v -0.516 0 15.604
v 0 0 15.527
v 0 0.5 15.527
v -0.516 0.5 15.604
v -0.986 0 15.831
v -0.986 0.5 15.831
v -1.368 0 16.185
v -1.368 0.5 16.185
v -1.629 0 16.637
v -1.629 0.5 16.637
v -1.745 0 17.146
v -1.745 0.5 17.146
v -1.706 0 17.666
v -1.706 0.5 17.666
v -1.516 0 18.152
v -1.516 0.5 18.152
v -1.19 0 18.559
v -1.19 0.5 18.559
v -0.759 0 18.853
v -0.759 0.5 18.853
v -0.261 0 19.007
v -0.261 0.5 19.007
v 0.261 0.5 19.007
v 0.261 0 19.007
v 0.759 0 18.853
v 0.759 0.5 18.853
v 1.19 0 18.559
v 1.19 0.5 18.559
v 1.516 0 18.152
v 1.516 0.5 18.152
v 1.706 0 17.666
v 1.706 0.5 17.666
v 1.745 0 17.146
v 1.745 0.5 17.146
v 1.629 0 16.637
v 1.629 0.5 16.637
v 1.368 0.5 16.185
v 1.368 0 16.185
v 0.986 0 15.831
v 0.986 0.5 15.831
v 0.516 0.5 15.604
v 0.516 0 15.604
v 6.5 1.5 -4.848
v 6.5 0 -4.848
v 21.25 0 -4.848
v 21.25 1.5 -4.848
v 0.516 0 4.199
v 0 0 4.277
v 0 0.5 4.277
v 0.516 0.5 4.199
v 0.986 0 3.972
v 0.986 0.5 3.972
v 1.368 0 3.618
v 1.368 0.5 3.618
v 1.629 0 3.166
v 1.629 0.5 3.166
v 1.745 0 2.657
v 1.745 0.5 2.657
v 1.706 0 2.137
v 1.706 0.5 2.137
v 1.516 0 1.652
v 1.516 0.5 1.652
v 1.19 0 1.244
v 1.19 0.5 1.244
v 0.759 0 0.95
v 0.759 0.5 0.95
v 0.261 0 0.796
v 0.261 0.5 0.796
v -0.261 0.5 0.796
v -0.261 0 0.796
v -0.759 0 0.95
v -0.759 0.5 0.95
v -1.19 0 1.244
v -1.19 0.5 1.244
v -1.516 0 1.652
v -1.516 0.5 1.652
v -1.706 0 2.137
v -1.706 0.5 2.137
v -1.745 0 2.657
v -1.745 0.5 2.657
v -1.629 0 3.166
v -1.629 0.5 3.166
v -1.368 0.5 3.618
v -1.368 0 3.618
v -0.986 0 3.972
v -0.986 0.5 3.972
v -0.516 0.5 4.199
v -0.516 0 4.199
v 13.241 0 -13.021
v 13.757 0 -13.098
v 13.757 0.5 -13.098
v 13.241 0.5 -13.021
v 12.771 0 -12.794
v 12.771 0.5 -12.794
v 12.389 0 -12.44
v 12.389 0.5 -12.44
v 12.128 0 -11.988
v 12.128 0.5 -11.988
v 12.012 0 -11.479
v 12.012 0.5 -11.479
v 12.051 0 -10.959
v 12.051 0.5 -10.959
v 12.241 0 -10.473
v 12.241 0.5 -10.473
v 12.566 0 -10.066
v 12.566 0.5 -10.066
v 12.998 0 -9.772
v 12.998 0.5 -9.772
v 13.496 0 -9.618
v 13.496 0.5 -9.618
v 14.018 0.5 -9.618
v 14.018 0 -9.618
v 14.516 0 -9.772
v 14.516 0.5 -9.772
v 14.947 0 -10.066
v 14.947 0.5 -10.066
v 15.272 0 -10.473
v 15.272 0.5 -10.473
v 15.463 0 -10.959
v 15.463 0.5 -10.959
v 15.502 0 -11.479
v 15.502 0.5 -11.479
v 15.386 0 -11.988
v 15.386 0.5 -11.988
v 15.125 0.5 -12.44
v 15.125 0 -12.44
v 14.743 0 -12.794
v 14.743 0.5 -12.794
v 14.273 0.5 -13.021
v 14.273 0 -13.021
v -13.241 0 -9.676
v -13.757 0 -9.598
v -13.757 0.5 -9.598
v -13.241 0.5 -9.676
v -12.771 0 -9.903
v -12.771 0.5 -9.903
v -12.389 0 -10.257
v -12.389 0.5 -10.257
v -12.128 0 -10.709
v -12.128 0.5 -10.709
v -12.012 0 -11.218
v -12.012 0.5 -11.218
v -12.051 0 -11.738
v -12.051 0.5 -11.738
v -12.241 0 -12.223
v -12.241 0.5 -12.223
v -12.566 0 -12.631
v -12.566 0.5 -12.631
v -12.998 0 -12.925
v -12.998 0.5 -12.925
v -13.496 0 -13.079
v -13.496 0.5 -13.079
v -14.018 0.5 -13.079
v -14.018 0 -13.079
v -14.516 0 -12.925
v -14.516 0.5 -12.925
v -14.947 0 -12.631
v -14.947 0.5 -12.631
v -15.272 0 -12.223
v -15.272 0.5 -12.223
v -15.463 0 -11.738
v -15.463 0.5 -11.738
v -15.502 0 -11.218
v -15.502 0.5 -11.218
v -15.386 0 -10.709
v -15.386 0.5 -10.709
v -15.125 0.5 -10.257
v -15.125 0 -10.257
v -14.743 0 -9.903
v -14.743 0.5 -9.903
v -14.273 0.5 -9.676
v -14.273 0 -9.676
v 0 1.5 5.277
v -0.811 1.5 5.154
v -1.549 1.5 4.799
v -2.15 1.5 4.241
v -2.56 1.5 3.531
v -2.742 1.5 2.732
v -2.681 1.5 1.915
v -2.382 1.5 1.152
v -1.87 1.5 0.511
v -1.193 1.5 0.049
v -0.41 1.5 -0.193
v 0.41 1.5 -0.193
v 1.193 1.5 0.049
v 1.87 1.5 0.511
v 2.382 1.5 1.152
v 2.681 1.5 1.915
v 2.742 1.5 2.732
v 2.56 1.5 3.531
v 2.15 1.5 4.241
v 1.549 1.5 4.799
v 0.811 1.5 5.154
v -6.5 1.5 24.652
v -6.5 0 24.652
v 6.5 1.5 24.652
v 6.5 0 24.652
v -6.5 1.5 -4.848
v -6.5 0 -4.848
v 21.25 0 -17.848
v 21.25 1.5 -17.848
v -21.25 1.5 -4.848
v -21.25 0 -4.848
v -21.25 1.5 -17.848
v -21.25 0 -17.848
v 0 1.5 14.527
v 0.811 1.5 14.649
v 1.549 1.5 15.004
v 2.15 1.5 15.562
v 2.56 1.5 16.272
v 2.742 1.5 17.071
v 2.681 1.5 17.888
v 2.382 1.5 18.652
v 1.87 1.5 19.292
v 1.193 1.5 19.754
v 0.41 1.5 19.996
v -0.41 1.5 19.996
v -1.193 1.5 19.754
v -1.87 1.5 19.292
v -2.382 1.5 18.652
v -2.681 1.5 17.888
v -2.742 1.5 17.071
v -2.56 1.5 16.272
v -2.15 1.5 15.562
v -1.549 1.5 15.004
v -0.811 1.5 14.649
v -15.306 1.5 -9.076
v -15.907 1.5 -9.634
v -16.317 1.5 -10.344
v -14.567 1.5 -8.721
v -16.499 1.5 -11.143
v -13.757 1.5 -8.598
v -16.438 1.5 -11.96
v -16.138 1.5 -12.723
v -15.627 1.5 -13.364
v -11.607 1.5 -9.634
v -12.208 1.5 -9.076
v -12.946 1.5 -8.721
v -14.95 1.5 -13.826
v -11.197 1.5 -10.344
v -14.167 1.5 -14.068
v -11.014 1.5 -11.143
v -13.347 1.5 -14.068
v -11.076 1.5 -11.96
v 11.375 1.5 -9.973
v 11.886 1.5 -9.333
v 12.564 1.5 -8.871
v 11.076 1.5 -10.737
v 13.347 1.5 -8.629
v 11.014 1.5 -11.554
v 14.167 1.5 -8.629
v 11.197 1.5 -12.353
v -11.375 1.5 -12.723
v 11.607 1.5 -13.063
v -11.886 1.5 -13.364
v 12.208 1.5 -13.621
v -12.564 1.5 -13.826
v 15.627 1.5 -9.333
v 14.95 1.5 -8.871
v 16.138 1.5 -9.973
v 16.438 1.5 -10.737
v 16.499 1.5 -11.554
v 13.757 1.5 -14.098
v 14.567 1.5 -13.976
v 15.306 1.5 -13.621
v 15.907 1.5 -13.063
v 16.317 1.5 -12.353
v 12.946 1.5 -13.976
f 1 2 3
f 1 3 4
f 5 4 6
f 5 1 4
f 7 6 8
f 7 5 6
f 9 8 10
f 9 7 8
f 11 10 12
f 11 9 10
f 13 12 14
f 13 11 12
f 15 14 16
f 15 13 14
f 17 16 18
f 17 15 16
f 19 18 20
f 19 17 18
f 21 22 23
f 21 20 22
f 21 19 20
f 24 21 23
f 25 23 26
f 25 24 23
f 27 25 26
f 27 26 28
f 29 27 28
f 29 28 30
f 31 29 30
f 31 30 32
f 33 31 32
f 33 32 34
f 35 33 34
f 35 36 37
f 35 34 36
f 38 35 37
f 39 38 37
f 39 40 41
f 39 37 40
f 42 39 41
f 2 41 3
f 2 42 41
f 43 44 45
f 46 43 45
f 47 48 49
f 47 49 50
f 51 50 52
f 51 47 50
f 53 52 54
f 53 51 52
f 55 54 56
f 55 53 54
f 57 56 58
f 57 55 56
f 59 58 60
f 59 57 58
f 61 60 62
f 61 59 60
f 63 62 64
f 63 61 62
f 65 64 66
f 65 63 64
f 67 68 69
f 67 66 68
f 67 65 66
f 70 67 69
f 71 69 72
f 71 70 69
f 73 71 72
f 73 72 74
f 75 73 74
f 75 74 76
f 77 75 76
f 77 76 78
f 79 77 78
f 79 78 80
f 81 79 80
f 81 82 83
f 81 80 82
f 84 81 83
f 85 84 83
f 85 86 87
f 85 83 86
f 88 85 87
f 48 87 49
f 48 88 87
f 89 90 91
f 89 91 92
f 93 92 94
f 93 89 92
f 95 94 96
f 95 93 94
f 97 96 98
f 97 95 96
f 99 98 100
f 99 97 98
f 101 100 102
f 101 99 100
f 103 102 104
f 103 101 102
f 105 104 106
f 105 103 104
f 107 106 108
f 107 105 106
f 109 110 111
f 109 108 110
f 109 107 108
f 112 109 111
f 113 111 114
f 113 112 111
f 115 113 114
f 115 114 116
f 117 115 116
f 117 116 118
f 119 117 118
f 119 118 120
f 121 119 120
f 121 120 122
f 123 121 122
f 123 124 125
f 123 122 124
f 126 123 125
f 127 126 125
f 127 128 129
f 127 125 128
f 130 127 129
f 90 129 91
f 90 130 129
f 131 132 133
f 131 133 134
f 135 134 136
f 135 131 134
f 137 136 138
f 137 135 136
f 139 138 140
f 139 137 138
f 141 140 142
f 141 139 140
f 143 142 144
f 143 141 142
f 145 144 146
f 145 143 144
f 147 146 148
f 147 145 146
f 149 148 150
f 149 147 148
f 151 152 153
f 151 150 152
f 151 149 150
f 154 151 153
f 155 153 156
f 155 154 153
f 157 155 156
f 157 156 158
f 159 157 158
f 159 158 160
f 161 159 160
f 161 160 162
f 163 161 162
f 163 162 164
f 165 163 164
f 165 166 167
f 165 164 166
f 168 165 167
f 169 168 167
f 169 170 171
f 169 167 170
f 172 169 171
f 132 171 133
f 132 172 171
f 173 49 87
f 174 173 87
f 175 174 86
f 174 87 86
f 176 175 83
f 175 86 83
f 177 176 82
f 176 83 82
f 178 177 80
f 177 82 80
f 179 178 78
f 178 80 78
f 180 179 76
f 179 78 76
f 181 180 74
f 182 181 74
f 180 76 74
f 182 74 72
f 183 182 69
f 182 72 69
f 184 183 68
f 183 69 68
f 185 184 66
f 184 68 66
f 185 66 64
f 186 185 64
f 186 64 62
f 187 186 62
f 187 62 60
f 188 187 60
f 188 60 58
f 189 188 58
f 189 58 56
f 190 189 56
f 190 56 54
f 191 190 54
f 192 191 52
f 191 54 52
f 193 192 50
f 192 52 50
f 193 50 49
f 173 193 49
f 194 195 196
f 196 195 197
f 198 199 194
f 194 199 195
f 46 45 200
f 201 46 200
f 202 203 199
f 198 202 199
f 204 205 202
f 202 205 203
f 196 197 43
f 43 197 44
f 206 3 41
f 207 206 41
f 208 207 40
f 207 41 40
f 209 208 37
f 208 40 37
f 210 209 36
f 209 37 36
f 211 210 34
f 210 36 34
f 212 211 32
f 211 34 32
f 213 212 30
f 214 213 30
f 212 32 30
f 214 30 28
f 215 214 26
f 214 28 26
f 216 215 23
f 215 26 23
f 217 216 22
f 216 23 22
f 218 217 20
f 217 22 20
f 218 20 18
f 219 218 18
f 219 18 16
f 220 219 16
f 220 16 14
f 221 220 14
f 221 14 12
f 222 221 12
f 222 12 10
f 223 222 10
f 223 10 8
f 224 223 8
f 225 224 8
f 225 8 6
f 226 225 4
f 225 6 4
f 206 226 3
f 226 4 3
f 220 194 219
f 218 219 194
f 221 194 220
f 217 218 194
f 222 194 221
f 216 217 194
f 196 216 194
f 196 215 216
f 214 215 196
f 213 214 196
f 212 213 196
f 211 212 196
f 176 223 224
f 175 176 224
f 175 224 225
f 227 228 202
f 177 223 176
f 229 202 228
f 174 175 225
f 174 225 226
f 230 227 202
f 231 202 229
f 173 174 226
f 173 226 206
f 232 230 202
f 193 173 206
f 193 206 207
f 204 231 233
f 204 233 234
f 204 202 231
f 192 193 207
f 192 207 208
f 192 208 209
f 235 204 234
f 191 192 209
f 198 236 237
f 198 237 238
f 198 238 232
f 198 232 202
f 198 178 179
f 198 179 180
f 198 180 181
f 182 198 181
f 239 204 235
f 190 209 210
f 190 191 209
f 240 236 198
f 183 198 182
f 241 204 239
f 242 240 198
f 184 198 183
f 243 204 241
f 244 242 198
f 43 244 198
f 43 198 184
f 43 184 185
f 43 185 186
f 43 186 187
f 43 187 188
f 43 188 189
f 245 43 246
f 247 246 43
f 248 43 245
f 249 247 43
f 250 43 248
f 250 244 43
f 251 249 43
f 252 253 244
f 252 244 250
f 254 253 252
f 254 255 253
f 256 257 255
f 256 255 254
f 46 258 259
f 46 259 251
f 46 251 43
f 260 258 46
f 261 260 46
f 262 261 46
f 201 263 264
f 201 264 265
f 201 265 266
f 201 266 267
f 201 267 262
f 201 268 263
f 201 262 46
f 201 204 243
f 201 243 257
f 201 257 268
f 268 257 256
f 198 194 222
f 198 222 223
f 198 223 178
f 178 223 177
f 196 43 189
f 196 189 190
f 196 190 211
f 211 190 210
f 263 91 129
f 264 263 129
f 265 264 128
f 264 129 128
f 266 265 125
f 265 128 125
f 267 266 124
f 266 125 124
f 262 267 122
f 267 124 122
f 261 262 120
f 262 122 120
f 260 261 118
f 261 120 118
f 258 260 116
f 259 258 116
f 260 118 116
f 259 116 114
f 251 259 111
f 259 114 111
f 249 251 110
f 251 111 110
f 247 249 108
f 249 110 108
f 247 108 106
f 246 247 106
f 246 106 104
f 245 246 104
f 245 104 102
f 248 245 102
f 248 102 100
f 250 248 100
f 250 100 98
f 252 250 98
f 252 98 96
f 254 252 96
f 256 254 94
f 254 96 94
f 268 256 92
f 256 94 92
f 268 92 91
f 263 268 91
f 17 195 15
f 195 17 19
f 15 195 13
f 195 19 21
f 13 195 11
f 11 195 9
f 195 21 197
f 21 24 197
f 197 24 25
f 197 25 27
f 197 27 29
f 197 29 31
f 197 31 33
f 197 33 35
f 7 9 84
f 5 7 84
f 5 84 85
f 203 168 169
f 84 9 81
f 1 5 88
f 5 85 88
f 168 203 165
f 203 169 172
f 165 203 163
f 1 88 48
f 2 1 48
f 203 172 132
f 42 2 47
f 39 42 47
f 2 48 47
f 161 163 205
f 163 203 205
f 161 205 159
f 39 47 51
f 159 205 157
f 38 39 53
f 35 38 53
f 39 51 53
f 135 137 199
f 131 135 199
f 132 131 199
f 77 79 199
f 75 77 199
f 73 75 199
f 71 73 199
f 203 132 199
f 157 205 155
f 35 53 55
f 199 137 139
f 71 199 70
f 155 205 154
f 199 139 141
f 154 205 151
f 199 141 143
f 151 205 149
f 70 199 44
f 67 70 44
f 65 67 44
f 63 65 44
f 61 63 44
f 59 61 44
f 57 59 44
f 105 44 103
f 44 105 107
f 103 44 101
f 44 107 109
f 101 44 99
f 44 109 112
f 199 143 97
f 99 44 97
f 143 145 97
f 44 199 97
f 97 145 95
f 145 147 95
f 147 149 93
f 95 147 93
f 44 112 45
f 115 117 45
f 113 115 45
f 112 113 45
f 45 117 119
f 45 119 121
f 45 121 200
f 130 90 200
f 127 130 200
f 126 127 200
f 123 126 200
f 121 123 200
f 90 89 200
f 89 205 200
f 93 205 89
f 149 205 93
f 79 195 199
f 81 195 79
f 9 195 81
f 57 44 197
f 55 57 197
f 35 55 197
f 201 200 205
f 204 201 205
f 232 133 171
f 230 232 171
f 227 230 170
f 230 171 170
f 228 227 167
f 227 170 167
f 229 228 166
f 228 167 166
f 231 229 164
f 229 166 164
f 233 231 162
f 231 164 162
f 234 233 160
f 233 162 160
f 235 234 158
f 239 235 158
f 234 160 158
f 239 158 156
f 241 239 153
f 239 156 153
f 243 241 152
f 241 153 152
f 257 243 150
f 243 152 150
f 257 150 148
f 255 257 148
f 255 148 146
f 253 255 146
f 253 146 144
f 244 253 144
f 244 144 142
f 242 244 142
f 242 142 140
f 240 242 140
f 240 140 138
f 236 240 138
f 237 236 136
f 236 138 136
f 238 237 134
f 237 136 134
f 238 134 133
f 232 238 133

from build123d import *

# Parameters (mm, degrees)
BOSS_EXTRUDE1_DEPTH     = 1.5
CUT_EXTRUDE1_DEPTH      = 33.580828274
CUT_EXTRUDE1_DEPTH_BACK = 33.580828274
SKETCH2_R               = 1.75
CHAMFER2_SIZE           = 1
CHAMFER4_SIZE           = 1


with BuildPart() as part:
    # Sketch1 → Boss-Extrude1 (new body)
    with BuildSketch(Plane(origin=(0, 0, 0), x_dir=(1, 0, 0), z_dir=(0, 1, 0))):
        Polygon((21.25, 17.848471223), (-21.25, 17.848471223), (-21.25, 4.848471223), (-6.5, 4.848471223), (-6.5, -24.651528777), (6.5, -24.651528777), (6.5, 4.848471223), (21.25, 4.848471223), align=None)
    extrude(amount=BOSS_EXTRUDE1_DEPTH)

    # Sketch2 → Cut-Extrude1 (cut, two sides: drawn at the far end of the back side and taken through both)
    with BuildSketch(Plane(origin=(0, 1.5, 0), x_dir=(1, 0, 0), z_dir=(0, 1, 0)).offset(-CUT_EXTRUDE1_DEPTH_BACK)):
        with Locations(Location((-13.756799801, 11.348471223, 0), (0, 0, 270))):
            Circle(SKETCH2_R)
        with Locations(Location((13.756799801, 11.348471223, 0), (0, 0, 90))):
            Circle(SKETCH2_R)
        with Locations(Location((0, -2.526528777, 0), (0, 0, 270))):
            Circle(SKETCH2_R)
        with Locations(Location((0, -17.276528777, 0), (0, 0, 90))):
            Circle(SKETCH2_R)
    extrude(amount=CUT_EXTRUDE1_DEPTH + CUT_EXTRUDE1_DEPTH_BACK, mode=Mode.SUBTRACT)

    # Chamfer2
    chamfer2_edges = [part.edges().sort_by_distance(p)[0] for p in [
        (-13.756799801, 1.5, -13.098471223),
    ]]
    chamfer(chamfer2_edges, length=CHAMFER2_SIZE)

    # Chamfer4
    chamfer4_edges = [part.edges().sort_by_distance(p)[0] for p in [
        (13.756799801, 1.5, -9.598471223),
        (0, 1.5, 19.026528777),
        (0, 1.5, 0.776528777),
    ]]
    chamfer(chamfer4_edges, length=CHAMFER4_SIZE)


solid = part.part
